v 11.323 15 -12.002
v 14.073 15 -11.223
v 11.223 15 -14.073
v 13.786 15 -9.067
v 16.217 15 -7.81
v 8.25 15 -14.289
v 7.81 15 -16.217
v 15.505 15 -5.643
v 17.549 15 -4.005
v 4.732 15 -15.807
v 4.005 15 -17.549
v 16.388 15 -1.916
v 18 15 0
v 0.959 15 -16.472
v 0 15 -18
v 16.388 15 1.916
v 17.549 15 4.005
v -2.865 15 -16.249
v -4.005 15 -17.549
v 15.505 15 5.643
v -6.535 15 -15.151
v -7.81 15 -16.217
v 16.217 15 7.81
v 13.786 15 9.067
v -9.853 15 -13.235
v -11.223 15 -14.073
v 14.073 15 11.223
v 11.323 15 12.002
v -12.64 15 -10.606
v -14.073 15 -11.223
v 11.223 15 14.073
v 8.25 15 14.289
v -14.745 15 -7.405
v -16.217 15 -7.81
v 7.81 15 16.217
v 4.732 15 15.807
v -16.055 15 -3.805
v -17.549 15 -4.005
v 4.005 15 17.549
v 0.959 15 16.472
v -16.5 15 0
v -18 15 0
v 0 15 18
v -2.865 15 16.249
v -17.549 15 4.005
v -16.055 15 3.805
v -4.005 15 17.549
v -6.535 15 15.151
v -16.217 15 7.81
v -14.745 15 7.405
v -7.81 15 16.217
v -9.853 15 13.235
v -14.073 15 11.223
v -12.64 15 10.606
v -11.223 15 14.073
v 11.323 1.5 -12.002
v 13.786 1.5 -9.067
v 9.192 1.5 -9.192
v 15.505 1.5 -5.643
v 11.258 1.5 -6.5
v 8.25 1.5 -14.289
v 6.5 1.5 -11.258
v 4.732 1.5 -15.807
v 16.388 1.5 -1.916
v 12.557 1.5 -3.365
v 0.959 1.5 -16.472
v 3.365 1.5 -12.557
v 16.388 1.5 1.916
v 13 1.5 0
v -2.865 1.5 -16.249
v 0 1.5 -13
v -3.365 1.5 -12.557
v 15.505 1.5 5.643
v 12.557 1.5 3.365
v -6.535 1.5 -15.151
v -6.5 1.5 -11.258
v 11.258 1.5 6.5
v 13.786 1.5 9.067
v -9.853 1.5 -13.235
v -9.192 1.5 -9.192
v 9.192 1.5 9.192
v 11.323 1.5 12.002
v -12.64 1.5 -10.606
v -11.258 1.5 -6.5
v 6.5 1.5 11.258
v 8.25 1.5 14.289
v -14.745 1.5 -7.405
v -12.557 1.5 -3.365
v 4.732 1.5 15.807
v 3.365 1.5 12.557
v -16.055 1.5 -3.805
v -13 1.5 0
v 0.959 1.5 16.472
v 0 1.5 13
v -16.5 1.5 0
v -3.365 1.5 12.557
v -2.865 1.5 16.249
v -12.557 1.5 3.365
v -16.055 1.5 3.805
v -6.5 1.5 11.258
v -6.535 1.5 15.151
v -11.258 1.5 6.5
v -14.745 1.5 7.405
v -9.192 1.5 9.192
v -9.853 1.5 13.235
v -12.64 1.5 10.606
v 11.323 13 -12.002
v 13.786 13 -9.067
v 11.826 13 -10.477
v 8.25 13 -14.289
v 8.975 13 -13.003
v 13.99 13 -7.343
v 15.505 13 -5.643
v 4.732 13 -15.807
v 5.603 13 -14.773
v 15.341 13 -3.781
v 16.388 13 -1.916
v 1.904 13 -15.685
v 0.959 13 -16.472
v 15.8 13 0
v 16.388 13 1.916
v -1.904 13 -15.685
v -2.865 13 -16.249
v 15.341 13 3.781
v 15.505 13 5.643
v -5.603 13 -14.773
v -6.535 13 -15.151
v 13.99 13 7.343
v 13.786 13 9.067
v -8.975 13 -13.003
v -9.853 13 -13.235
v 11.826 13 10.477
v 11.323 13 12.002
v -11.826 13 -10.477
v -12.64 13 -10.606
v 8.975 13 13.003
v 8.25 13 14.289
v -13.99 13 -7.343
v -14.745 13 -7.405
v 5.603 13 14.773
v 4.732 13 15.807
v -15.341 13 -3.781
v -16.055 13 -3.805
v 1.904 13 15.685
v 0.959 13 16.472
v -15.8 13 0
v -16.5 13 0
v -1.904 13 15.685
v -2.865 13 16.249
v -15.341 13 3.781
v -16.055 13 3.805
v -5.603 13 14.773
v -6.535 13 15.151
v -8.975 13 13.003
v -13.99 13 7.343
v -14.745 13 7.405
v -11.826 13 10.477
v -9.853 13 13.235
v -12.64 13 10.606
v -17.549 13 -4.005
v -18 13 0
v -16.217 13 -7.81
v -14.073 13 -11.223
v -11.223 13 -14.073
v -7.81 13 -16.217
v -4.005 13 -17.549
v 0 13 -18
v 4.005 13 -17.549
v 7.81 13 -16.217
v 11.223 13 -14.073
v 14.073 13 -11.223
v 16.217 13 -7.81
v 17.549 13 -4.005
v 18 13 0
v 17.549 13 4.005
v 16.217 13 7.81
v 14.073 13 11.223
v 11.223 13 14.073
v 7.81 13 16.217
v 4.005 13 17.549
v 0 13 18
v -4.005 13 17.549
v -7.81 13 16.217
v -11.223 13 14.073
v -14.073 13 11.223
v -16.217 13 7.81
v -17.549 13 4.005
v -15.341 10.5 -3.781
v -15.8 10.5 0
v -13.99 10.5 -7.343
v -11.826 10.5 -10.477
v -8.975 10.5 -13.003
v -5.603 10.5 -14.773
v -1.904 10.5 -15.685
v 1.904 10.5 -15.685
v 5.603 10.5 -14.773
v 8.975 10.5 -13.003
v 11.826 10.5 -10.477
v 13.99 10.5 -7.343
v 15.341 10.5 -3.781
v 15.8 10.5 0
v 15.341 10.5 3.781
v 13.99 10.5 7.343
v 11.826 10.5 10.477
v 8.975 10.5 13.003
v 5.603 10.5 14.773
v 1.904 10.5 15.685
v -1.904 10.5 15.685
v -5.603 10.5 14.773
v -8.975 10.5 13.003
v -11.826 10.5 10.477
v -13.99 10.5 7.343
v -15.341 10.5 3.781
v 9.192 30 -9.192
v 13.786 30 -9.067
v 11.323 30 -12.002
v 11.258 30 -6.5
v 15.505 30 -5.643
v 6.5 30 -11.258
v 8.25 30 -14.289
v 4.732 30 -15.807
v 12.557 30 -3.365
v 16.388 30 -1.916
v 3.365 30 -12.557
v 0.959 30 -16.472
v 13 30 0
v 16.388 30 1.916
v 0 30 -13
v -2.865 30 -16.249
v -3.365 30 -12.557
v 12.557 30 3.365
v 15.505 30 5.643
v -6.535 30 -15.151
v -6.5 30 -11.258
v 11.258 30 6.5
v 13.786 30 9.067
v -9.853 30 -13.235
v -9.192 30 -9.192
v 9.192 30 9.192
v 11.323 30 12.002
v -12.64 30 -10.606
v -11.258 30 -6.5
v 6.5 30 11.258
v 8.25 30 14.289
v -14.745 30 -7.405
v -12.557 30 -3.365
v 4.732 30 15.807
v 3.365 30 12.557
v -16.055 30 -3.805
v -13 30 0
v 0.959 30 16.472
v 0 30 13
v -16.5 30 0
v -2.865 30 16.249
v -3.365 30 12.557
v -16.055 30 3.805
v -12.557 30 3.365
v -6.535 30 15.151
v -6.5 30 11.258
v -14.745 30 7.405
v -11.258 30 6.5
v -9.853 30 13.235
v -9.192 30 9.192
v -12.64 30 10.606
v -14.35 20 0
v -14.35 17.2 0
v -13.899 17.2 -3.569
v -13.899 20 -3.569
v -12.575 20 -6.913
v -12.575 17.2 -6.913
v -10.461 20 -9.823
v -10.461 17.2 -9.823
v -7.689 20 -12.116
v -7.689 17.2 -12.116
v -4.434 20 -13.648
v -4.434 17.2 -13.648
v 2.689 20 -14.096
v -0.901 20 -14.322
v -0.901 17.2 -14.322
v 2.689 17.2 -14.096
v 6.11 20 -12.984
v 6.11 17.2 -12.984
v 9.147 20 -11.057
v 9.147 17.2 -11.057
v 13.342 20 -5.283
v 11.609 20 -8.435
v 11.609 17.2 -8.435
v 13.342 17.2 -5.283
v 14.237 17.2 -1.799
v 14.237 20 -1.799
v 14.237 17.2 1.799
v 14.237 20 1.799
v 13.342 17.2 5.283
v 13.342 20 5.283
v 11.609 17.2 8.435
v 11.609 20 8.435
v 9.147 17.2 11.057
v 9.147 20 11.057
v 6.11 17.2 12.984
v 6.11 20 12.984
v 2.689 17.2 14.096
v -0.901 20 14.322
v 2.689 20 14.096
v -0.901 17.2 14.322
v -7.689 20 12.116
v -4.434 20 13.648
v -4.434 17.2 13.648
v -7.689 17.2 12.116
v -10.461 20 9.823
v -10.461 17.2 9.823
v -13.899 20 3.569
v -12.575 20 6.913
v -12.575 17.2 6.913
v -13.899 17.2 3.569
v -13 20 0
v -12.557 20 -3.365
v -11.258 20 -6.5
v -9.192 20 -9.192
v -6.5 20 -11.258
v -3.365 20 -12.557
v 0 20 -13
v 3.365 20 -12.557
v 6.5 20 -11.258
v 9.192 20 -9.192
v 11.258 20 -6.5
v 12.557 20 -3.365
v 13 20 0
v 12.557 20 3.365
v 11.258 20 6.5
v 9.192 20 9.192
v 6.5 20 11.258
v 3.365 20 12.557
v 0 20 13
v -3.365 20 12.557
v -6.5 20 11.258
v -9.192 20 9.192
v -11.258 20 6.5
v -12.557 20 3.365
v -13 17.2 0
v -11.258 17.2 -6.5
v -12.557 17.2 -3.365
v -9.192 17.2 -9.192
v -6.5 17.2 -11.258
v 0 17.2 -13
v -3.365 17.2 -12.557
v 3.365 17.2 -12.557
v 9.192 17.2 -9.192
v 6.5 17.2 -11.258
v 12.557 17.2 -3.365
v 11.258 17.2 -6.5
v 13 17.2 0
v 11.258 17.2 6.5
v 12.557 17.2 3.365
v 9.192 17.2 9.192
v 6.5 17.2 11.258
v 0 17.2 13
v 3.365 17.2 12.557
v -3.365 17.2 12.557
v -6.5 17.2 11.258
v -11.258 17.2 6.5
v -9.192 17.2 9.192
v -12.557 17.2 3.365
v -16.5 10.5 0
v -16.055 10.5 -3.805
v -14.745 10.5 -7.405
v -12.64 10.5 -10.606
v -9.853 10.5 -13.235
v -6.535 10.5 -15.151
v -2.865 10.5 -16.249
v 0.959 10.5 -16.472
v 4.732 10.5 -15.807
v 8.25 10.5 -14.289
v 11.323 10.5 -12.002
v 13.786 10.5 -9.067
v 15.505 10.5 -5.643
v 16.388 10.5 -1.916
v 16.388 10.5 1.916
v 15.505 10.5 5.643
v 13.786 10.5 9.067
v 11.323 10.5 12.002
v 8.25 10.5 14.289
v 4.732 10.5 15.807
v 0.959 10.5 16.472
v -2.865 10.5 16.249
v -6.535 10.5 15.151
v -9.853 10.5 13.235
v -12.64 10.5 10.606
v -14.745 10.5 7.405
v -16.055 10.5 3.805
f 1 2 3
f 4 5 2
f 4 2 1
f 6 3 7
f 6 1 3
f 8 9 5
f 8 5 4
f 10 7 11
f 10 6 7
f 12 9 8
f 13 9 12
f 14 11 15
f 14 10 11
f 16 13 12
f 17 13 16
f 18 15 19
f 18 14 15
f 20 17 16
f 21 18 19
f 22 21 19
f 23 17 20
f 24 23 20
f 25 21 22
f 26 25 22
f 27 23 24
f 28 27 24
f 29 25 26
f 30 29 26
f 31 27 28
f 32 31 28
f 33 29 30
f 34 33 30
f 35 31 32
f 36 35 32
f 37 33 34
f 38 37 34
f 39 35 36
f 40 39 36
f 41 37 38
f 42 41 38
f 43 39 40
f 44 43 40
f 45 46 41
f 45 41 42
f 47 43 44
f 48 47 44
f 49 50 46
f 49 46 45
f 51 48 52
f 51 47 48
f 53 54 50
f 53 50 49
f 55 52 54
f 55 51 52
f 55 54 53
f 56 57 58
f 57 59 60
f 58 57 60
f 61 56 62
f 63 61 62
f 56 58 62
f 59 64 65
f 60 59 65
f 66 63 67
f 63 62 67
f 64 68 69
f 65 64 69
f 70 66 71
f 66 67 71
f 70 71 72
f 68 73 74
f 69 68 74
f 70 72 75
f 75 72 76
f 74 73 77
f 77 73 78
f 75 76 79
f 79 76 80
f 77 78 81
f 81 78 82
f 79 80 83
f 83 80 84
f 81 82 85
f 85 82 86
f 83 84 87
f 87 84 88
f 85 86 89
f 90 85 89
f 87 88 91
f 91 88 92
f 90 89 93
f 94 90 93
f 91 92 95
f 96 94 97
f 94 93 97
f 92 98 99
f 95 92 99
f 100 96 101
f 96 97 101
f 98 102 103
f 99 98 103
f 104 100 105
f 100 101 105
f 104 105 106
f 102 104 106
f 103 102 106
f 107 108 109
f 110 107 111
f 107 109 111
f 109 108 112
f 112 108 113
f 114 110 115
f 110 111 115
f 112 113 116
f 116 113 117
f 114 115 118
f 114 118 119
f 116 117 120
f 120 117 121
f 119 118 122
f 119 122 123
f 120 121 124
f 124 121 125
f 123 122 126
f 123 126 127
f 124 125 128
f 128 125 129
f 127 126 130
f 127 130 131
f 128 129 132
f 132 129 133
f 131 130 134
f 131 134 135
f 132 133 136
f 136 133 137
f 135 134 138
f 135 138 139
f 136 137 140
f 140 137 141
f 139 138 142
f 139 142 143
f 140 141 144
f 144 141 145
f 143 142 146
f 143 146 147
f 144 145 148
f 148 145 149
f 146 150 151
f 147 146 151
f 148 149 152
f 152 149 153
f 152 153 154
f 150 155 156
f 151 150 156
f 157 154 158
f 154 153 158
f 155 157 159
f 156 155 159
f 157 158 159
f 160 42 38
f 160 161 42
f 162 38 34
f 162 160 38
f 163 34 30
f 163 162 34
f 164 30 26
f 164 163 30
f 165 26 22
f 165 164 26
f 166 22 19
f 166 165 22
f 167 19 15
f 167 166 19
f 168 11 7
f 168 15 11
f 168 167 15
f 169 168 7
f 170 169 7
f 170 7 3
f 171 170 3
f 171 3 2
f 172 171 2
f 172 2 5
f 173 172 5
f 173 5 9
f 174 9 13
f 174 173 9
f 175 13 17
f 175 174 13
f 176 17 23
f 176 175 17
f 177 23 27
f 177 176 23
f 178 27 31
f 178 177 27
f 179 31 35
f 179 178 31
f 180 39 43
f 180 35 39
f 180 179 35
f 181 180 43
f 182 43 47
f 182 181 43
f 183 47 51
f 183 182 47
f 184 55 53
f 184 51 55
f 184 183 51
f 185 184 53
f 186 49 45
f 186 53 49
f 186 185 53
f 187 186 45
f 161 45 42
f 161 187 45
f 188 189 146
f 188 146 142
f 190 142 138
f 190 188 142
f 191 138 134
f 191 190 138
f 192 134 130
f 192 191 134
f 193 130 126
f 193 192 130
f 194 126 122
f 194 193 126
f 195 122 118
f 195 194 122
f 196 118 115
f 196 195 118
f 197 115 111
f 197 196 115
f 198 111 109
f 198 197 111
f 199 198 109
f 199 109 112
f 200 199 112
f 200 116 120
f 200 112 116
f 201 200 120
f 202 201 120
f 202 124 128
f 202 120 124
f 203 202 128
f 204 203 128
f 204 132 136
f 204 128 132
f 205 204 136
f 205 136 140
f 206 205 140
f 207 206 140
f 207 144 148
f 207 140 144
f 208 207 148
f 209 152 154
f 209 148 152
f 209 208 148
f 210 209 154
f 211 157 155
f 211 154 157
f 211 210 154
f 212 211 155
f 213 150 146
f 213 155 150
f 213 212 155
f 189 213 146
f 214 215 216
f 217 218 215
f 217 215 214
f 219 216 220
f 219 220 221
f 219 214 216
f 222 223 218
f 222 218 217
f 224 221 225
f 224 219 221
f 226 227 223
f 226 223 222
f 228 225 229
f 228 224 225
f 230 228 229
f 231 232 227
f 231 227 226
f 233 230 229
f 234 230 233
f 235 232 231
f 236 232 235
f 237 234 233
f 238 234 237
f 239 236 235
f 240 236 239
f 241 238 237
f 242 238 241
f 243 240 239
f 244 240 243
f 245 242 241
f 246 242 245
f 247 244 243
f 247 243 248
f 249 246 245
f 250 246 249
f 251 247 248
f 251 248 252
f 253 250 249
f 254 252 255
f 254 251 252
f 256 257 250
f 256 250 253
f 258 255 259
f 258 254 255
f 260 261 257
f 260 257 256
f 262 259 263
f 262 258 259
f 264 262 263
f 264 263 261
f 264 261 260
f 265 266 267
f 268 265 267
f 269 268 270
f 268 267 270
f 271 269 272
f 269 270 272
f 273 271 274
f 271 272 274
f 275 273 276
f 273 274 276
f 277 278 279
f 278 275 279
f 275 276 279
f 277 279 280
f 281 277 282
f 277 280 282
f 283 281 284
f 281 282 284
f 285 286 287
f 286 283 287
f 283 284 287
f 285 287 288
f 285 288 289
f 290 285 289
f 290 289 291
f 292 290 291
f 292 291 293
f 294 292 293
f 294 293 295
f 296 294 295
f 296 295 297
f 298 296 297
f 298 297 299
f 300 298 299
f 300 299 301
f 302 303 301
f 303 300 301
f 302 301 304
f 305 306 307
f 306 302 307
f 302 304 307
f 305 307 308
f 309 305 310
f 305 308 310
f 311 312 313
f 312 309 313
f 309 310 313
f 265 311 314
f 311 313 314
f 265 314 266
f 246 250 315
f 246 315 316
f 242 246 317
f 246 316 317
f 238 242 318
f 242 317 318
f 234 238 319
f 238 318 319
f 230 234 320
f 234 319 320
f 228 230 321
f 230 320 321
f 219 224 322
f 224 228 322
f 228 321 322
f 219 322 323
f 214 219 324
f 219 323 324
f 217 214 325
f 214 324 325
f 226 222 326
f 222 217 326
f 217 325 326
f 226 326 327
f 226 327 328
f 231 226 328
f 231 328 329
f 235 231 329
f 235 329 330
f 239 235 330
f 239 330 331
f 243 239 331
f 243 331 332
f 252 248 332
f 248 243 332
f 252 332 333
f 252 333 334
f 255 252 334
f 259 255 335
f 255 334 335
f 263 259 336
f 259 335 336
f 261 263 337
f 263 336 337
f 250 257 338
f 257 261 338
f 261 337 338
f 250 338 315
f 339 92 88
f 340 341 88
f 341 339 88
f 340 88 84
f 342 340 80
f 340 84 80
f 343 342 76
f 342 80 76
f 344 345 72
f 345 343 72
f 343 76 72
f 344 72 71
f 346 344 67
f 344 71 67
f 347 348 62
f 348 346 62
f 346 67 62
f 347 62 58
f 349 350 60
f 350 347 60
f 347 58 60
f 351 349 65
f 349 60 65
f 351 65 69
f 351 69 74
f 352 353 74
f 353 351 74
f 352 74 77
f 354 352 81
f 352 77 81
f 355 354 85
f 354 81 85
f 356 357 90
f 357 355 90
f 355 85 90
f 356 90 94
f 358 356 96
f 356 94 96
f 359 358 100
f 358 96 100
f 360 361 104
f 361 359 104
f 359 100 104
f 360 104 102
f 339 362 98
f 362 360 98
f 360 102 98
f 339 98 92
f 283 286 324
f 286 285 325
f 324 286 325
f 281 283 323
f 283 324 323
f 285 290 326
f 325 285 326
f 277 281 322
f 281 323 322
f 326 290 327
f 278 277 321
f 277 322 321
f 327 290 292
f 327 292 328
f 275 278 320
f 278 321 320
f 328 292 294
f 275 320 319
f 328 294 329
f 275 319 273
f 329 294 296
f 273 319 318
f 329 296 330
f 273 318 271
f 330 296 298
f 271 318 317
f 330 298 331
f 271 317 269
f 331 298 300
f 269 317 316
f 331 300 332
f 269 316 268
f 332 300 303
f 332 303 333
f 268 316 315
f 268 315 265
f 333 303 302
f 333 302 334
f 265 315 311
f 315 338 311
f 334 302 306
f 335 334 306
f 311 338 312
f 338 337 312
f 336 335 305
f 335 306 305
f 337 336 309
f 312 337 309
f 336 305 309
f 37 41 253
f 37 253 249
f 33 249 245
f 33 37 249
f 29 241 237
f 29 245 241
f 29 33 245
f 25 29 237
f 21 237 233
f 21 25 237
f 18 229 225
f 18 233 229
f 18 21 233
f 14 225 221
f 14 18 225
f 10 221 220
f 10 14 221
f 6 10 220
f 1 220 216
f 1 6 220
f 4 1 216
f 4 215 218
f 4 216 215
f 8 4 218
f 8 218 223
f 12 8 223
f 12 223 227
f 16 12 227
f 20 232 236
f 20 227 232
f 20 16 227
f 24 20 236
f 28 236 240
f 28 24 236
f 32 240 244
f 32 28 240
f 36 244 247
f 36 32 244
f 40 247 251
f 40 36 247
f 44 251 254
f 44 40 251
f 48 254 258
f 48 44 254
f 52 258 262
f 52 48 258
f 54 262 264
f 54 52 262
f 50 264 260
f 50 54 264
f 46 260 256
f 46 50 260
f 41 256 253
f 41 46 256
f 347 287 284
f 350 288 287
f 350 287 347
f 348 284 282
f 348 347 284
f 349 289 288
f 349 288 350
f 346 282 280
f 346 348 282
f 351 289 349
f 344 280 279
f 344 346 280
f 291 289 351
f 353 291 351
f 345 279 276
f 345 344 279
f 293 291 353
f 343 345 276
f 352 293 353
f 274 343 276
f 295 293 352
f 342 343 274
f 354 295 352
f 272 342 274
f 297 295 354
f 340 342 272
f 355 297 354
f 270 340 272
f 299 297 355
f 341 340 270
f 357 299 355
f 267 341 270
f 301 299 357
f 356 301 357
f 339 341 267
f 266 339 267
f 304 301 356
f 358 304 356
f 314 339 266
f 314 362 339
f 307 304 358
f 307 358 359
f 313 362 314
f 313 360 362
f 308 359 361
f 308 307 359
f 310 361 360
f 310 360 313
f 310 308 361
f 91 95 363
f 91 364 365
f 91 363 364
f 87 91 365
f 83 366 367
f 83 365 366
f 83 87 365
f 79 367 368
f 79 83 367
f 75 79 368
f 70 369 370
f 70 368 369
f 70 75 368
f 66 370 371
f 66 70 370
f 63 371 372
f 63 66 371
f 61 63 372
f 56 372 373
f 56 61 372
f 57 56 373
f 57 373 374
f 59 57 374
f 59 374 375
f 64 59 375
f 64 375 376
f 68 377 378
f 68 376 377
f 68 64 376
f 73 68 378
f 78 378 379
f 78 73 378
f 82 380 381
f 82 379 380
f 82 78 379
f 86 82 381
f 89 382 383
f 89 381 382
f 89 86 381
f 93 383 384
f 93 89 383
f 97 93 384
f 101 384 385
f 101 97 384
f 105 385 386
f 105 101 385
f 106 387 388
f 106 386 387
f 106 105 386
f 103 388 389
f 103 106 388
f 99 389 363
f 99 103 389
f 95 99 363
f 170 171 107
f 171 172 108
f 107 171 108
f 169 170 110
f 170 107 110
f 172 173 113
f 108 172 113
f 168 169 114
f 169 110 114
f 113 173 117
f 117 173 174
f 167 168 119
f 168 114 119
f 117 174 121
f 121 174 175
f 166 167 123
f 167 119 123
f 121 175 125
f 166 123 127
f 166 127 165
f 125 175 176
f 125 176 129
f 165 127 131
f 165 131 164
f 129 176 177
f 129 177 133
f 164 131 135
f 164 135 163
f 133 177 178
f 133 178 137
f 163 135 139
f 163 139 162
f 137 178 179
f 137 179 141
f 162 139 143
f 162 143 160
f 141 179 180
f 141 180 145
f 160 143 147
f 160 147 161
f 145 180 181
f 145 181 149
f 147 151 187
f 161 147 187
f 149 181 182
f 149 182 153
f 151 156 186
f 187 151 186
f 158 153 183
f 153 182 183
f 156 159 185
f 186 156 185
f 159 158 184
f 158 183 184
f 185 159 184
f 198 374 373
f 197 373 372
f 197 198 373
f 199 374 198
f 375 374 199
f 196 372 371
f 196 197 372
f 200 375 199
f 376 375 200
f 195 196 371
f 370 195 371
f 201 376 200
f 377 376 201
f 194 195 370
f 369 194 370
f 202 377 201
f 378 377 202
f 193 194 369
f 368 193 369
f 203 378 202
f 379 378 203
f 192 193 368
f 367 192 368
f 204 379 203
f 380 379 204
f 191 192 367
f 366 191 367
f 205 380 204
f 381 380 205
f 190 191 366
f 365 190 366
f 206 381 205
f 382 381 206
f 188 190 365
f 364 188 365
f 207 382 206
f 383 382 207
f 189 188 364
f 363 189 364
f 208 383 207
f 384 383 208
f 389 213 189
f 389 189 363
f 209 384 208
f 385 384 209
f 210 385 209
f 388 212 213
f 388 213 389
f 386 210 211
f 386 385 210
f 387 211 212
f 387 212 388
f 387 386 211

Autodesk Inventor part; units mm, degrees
ref_plane "YZ Plane" through (0, 0, 0) normal (1, 0, 0) x (0, 1, 0)
ref_plane "XZ Plane" through (0, 0, 0) normal (0, 1, 0) x (-1, 0, 0)
ref_plane "XY Plane" through (0, 0, 0) normal (0, 0, 1) x (1, 0, 0)
sketch "Sketch2" plane through (0, 0, 0) normal (0, 0, 1) x (1, 0, 0)
  line L0 (0, 0) -> (0, 30)
  line L1 (0, 30) -> (-16.5, 30)
  line L2 (0, 0) -> (-13, 0)
  line L3 (-13, 0) -> (-16.5, 0)
  line L4 (-13, 30) -> (-13, 20)
  line L5 (-13, 20) -> (-14.35, 20)
  line L6 (-14.35, 20) -> (-14.35, 17.2)
  line L7 (-14.35, 17.2) -> (-13, 17.2)
  line L8 (-13, 17.2) -> (-13, 0)
  line L9 (-16.5, 13) -> (-15.8, 13)
  line L10 (-15.8, 13) -> (-15.8, 10.5)
  line L11 (-15.8, 10.5) -> (-16.5, 10.5)
  line L12 (-16.5, 30) -> (-16.5, 15)
  line L13 (-16.5, 15) -> (-18, 15)
  line L14 (-18, 15) -> (-18, 13)
  line L15 (-18, 13) -> (-16.5, 13)
  line L16 (-16.5, 10.5) -> (-16.5, 1.5)
  line L17 (-16.5, 1.5) -> (-13, 1.5)
  dimension "d4" = 30
  dimension "d5" = 16.5
  dimension "d6" = 13
  dimension "d7" = 10
  dimension "d8" = 1.35
  dimension "d9" = 2.8
  dimension "d13" = 17
  dimension "d14" = 0.7
  dimension "d15" = 2.5
  dimension "d18" = 15
  dimension "d19" = 1.5
  dimension "d20" = 10.5
  dimension "d21" = 9
revolve "Revolution1" add sketch "Sketch2" angle 360 about axis through (0, 0, 0) along (0, 1, 0) contours L4 L5 L6 L7 L8 L17 L16 L11 L10 L9 L15 L14 L13 L12 L1
thread "Thread3" size "M33x3" class "6g" standard "ANSI Metric M Profile" full length
properties part number "Heated tube-top connector" material "Polypropylene"
